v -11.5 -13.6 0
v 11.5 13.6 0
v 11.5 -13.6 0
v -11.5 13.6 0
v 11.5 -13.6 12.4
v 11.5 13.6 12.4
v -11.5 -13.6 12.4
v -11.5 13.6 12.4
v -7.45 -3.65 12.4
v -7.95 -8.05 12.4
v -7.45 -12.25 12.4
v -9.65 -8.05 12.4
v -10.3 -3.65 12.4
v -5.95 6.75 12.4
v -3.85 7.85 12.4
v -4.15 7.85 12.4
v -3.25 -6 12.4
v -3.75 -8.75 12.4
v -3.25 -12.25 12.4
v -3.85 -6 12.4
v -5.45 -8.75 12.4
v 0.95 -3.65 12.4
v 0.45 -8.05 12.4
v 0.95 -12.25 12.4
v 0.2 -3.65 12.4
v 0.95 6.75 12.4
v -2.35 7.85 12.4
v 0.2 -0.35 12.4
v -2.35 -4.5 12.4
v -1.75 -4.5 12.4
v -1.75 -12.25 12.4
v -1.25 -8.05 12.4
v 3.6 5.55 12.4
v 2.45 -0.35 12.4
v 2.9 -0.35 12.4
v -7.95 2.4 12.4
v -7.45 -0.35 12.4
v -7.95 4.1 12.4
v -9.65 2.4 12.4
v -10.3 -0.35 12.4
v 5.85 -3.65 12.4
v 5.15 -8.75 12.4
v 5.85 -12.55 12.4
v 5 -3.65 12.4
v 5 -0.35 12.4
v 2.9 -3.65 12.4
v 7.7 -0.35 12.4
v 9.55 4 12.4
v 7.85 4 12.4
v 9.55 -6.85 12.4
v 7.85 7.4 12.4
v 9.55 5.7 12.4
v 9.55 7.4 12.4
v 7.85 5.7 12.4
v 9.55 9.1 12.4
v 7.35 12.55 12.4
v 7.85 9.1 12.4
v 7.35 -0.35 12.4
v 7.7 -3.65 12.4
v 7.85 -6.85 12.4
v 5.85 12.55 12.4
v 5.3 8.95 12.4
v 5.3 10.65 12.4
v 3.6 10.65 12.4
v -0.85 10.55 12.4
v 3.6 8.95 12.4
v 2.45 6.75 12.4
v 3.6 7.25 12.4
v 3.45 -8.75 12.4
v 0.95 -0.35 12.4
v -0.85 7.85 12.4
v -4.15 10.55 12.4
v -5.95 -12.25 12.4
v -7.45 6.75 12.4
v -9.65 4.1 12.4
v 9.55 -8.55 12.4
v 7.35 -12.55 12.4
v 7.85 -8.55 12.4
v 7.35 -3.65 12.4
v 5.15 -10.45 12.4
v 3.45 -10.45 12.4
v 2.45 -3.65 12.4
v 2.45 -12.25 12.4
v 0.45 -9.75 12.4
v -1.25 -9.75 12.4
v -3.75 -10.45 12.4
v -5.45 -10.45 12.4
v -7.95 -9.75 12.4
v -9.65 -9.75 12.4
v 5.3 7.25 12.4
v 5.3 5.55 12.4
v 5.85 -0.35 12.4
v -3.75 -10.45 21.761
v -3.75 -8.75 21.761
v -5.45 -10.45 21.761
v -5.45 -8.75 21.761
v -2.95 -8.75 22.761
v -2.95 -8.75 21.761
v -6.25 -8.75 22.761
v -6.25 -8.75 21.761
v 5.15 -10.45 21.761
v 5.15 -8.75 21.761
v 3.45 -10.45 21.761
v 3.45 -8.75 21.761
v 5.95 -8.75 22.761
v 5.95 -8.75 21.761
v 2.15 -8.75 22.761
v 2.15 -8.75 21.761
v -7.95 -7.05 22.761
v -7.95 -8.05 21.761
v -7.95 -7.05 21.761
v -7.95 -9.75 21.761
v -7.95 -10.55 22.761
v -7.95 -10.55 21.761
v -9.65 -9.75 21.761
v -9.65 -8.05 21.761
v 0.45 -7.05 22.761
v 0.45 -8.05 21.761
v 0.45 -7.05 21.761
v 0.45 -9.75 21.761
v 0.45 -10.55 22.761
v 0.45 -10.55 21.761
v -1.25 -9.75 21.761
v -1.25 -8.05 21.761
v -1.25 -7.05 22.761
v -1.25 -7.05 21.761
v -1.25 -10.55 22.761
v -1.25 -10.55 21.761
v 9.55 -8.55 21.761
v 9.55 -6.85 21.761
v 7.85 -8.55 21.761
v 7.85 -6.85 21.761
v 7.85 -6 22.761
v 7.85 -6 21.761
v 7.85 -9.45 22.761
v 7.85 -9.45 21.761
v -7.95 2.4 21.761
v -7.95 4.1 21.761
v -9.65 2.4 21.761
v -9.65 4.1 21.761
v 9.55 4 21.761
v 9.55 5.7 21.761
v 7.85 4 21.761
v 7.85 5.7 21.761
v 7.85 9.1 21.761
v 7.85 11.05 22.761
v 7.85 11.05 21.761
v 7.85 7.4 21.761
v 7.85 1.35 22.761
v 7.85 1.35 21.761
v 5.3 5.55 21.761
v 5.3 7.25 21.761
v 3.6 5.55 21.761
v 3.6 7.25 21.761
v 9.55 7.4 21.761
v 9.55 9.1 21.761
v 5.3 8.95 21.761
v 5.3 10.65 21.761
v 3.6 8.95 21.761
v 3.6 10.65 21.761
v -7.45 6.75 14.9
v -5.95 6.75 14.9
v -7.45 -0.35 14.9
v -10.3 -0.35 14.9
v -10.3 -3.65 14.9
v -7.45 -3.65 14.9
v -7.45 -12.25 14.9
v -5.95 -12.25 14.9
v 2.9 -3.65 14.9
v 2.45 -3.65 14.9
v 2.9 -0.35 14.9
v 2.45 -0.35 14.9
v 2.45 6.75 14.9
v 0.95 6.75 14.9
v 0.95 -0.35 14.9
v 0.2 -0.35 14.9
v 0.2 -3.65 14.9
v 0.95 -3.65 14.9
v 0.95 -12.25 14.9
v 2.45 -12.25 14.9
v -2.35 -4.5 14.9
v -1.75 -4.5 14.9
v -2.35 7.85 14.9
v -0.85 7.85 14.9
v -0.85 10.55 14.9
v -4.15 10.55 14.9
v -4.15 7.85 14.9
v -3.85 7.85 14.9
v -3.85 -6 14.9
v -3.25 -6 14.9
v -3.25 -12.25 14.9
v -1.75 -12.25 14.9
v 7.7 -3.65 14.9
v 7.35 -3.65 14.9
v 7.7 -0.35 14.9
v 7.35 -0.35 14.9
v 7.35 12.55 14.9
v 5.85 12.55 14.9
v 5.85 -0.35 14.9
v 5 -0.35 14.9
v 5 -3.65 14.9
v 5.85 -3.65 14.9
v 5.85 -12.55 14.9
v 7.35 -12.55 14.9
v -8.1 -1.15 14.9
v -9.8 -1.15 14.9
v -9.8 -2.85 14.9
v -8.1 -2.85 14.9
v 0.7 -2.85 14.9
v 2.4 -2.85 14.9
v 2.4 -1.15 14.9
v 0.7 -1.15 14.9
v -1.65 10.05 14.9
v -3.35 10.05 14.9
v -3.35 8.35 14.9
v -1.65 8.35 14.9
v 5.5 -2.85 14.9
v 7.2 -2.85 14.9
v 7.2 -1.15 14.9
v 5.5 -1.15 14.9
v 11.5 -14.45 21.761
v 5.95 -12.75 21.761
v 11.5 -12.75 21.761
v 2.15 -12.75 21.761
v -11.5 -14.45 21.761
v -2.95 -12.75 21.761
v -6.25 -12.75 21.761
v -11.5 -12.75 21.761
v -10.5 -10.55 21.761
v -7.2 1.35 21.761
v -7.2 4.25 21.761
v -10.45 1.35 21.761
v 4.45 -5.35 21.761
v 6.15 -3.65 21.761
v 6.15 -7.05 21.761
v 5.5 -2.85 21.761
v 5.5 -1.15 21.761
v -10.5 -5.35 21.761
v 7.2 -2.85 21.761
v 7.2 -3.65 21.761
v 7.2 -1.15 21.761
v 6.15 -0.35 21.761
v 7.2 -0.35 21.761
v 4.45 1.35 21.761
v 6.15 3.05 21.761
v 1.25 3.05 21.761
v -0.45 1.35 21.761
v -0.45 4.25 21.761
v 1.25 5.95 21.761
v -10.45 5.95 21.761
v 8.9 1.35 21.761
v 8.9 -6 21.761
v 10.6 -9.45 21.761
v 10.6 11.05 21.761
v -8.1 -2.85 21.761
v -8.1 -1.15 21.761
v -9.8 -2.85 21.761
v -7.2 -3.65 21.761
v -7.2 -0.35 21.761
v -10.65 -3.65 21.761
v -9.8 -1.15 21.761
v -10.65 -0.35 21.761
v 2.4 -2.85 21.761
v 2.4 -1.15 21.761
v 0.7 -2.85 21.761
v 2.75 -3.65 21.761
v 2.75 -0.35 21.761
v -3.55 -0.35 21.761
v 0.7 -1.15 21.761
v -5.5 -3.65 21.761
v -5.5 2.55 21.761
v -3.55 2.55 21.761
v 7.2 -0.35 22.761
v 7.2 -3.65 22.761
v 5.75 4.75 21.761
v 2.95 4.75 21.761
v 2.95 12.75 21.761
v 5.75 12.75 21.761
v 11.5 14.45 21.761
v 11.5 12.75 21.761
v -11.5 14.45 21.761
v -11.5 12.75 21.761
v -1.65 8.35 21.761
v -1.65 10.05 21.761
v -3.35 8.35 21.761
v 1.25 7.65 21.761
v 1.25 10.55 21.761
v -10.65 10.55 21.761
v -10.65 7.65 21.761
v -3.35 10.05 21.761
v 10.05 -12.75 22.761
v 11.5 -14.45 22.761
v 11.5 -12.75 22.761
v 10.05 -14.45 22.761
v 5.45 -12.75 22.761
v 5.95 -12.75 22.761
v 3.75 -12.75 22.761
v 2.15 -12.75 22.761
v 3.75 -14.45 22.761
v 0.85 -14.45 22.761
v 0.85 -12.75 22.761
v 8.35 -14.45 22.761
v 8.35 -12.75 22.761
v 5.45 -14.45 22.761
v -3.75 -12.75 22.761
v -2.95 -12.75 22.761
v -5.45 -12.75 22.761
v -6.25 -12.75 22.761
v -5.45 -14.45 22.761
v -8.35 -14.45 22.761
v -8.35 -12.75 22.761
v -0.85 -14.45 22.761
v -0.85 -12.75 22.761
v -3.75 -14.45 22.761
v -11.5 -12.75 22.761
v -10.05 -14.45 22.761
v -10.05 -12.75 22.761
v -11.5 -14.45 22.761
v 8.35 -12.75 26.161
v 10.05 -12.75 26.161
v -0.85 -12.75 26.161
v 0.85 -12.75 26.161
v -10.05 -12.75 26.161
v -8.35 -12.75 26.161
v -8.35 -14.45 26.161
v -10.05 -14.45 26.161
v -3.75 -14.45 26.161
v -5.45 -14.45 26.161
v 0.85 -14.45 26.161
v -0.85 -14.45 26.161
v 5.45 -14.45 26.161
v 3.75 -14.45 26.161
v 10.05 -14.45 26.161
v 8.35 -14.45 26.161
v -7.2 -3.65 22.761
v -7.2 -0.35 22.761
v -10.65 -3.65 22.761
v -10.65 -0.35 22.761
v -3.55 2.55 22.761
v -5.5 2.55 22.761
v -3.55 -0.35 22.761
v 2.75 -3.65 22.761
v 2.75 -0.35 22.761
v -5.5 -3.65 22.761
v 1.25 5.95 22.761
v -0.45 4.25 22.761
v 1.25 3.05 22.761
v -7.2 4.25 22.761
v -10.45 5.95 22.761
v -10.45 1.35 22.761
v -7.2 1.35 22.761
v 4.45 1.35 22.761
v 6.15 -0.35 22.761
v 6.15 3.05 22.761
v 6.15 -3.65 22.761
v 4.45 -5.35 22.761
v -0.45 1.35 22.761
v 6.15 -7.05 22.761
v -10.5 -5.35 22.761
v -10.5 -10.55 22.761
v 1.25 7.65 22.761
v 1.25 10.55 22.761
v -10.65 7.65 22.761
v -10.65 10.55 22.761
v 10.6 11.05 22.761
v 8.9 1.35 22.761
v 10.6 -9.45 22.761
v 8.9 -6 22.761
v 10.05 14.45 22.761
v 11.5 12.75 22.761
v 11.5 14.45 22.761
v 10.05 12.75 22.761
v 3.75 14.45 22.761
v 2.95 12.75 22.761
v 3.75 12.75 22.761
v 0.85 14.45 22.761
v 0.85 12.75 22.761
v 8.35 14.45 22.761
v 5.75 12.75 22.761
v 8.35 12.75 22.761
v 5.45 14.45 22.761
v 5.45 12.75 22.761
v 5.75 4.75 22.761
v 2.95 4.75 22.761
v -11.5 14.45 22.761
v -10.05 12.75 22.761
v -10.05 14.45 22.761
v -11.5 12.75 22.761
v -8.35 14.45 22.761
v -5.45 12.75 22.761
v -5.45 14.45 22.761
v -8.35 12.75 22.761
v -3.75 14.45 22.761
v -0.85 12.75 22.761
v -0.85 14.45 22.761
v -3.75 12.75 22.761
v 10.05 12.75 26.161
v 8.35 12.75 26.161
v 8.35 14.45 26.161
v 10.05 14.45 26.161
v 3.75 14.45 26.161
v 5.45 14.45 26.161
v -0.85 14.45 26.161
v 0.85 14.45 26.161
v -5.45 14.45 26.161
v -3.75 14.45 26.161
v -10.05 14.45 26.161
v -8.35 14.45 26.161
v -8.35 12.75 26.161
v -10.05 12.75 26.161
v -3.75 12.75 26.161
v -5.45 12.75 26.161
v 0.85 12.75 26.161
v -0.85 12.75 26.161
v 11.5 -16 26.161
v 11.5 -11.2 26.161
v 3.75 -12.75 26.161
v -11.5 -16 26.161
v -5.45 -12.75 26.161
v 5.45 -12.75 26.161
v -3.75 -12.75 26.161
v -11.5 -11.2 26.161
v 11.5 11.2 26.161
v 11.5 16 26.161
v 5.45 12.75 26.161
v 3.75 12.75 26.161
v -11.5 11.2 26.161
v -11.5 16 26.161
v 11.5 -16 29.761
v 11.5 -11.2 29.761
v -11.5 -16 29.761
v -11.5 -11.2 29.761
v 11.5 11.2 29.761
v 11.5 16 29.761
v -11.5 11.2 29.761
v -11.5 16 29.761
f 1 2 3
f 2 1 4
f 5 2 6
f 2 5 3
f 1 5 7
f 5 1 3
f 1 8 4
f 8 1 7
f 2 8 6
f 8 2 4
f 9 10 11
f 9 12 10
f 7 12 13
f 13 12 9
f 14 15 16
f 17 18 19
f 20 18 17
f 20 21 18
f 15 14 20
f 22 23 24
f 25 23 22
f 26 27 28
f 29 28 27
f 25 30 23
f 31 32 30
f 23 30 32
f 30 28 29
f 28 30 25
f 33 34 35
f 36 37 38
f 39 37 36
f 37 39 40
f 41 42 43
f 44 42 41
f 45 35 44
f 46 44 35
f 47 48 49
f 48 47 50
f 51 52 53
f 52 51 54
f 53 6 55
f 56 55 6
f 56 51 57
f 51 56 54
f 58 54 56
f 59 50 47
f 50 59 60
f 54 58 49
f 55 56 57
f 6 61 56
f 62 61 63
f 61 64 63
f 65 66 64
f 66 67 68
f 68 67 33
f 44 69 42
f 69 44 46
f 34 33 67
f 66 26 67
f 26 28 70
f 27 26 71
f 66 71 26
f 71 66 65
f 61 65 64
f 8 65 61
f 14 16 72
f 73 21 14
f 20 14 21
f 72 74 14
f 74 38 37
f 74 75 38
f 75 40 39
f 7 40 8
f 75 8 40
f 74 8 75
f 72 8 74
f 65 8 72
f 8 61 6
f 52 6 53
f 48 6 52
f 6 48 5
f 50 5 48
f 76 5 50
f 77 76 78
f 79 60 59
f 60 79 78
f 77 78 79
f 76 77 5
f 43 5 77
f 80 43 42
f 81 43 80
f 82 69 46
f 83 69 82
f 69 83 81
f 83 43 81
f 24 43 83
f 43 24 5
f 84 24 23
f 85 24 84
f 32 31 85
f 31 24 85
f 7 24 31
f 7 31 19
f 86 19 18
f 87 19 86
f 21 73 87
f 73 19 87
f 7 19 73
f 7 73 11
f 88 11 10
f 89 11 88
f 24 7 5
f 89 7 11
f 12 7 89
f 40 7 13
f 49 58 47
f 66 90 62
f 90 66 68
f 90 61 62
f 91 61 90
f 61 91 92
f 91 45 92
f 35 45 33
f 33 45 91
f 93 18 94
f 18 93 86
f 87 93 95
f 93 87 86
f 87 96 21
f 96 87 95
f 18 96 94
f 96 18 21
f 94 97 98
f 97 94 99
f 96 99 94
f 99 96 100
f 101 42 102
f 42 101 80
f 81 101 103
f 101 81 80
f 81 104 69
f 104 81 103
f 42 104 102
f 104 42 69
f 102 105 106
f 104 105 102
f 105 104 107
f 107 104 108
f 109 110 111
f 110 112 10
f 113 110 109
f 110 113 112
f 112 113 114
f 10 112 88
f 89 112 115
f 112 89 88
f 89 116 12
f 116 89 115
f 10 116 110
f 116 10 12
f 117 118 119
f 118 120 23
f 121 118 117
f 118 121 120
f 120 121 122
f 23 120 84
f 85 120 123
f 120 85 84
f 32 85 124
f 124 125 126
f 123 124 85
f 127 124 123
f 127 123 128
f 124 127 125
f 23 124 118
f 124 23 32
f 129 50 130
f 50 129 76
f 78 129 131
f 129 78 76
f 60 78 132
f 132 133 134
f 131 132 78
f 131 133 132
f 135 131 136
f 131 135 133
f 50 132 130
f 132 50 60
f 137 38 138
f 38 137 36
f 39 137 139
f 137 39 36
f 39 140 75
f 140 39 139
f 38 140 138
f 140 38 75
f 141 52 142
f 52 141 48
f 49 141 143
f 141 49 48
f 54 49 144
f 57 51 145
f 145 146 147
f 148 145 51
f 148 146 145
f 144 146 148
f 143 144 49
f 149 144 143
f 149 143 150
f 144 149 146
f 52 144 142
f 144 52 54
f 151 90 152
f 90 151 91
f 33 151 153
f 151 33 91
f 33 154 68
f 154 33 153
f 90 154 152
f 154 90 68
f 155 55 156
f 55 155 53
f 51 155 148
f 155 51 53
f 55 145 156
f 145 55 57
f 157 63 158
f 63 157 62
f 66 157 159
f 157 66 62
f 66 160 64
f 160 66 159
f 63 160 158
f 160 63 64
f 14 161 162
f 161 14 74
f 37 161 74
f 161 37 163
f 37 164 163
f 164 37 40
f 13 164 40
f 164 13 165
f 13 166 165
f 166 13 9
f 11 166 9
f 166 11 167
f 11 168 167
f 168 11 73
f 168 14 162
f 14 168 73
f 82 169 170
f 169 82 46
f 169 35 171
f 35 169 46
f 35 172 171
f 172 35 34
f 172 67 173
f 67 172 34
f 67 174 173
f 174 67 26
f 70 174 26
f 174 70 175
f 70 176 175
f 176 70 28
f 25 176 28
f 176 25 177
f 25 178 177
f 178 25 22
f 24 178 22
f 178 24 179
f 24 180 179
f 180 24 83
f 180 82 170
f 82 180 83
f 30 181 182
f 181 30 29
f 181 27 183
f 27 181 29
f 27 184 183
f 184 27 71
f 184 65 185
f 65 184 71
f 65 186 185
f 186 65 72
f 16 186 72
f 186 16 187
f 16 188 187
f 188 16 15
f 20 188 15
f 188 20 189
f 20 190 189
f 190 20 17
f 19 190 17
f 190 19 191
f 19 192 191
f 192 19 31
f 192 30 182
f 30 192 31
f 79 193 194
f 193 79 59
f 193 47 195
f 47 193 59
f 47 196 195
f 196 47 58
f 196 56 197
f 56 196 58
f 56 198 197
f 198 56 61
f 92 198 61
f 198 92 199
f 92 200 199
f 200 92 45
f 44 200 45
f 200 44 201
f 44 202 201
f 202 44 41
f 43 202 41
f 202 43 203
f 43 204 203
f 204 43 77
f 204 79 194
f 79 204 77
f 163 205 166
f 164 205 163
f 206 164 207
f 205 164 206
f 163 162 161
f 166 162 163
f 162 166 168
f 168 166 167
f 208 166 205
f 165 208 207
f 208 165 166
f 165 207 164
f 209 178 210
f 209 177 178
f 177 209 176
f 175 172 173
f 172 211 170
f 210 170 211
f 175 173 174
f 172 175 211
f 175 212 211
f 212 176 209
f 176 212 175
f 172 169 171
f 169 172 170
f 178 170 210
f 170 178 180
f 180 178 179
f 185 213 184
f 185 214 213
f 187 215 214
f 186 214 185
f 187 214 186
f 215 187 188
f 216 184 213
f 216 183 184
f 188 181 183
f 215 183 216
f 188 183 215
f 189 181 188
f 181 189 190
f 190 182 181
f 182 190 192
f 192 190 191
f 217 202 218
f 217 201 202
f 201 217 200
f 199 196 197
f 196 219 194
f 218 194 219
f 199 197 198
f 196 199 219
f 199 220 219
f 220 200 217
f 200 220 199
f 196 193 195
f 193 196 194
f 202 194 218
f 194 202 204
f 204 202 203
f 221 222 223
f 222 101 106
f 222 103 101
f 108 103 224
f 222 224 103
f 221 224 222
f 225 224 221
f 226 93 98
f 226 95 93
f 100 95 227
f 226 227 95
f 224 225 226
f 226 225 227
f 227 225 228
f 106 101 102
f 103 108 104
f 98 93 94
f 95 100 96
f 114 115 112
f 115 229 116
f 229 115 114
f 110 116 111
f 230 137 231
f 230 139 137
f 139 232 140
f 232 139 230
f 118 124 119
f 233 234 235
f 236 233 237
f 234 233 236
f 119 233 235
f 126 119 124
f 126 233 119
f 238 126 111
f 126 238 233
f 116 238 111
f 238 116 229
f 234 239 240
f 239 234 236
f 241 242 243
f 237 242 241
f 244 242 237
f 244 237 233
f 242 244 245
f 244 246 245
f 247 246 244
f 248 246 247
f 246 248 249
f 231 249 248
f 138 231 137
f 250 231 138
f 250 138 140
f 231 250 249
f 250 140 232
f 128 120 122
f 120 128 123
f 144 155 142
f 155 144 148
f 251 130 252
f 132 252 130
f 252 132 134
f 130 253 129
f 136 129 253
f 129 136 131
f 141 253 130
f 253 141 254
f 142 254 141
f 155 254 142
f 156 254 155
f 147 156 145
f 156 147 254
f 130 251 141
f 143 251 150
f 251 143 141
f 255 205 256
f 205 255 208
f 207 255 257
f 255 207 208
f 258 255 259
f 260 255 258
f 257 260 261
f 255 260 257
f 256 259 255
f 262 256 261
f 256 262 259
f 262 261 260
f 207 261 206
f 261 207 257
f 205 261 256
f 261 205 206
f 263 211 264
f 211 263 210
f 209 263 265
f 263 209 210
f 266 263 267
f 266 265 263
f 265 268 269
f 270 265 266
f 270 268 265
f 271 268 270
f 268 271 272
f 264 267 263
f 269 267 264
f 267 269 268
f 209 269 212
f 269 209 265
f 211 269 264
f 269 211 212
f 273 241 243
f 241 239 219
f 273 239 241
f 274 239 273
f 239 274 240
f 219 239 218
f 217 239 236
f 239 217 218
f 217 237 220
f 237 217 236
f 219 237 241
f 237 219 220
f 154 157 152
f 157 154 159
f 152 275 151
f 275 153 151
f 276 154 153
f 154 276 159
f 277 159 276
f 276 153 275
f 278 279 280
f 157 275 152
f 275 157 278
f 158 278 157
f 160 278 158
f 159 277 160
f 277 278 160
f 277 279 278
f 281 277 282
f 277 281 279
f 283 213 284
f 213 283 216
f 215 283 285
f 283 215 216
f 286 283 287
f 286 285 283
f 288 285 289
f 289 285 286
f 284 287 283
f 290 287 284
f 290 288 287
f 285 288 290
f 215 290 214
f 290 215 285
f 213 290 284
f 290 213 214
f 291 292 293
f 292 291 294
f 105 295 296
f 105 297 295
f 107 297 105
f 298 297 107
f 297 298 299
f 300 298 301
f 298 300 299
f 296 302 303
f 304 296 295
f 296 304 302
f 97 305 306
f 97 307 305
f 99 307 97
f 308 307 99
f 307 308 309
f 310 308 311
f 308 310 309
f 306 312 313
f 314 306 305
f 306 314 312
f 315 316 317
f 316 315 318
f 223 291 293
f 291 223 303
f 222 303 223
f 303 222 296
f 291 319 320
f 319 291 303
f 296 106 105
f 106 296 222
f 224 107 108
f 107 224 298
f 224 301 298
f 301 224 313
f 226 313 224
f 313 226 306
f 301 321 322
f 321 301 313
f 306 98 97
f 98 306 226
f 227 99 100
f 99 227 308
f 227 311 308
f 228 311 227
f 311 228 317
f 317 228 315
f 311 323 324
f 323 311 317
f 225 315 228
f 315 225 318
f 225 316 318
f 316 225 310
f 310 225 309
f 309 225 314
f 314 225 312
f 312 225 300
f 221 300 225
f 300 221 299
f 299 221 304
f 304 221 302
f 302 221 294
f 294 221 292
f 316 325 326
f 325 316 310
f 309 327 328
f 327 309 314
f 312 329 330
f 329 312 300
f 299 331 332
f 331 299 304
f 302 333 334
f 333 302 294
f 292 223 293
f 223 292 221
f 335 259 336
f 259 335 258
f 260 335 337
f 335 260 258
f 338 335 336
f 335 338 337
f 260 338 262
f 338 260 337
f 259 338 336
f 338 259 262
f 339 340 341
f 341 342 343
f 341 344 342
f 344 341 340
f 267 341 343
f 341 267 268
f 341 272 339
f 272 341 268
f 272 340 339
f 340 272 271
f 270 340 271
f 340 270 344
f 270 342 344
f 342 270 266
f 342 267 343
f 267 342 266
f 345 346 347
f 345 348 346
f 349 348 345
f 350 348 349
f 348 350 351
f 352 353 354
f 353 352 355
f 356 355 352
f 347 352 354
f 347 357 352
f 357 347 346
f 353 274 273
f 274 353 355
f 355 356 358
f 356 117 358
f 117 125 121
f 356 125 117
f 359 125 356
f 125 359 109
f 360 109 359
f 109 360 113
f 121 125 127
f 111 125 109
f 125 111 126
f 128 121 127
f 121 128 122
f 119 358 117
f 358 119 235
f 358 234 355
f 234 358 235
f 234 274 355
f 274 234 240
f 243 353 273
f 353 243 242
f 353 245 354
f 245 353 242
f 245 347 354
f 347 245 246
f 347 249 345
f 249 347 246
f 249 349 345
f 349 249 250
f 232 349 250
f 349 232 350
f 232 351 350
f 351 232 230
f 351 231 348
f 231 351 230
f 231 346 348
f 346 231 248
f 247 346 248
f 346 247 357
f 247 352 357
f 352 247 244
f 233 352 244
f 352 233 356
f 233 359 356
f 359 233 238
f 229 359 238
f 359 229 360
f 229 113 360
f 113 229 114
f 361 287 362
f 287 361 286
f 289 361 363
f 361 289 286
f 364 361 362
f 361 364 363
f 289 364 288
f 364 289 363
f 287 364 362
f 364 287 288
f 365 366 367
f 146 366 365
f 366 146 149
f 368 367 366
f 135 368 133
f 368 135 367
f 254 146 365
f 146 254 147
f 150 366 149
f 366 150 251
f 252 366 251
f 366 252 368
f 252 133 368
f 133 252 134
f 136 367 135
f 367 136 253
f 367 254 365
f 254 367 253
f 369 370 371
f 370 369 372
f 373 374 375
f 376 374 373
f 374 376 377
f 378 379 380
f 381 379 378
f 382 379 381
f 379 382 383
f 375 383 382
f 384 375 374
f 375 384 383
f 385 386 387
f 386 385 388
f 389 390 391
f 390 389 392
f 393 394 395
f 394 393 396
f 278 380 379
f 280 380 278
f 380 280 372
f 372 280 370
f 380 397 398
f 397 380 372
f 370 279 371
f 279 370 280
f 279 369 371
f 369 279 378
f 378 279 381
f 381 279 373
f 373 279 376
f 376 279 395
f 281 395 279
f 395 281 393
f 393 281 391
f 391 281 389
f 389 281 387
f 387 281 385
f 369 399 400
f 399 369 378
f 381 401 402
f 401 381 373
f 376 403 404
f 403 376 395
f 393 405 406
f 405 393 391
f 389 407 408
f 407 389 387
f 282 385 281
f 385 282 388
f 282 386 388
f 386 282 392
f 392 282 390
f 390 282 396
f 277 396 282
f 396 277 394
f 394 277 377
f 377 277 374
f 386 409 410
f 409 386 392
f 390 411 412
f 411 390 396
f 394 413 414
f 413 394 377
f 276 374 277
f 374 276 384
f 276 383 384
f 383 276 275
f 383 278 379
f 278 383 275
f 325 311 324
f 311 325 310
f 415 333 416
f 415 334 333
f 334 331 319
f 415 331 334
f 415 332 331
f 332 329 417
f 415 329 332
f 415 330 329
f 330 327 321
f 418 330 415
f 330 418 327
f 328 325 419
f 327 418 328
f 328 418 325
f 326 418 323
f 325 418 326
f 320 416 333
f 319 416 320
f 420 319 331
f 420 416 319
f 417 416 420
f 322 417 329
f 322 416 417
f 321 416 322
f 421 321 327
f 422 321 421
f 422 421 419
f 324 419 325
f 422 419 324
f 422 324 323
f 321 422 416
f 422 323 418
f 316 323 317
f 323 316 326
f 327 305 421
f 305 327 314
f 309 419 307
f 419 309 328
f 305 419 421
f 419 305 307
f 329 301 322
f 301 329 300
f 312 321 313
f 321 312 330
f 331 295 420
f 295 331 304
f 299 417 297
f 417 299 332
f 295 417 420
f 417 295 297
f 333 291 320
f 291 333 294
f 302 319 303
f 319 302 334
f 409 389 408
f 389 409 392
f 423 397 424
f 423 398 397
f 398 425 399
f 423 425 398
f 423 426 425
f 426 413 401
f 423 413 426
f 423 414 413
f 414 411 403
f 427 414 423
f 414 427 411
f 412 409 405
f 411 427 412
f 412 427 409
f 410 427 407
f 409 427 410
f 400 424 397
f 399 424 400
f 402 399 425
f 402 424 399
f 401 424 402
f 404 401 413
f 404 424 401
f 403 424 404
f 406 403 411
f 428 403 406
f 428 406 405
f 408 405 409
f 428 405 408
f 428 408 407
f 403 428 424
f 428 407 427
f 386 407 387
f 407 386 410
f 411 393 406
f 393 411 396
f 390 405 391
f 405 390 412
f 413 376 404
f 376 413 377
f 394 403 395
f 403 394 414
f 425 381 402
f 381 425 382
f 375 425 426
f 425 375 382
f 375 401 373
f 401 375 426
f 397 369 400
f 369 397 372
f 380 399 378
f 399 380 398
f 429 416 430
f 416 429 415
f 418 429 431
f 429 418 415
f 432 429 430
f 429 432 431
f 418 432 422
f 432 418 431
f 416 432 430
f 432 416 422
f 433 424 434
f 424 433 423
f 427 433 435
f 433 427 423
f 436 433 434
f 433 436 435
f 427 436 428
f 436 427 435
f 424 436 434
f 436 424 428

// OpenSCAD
// Generated by SolidPython 0.4.2 on 2020-09-29 23:22:12
//!OpenSCAD

scale(v = 0.0100000000) {
	translate(v = [-1150, -1360, 0]) {
		union() {
			color(c = [0.4000000000, 0.4000000000, 0.4000000000]) {
				translate(v = [0, 0, 0]) {
					linear_extrude(height = 1000.0000000000) {
						polygon(paths = [[0, 1, 2, 3]], points = [[0, 0], [0, 2720], [2300, 2720], [2300, 0]]);
					}
				}
			}
			color(c = [0.2000000000, 0.6000000000, 0.2000000000]) {
				translate(v = [0, 0, 1000.0000000000]) {
					linear_extrude(height = 120.0000000000) {
						polygon(paths = [[0, 1, 2, 3]], points = [[0, 1305], [0, 2720], [2300, 2720], [2300, 1305]]);
					}
				}
			}
			color(c = [0.4000000000, 0.4000000000, 0.4000000000]) {
				translate(v = [0, 0, 1000.0000000000]) {
					linear_extrude(height = 120.0000000000) {
						polygon(paths = [[0, 1, 2, 3]], points = [[0, 0], [0, 1305], [2300, 1305], [2300, 0]]);
					}
				}
			}
			color(c = [0.9000000000, 0.6000000000, 0.6000000000]) {
				translate(v = [0, 0, 1120.0000000000]) {
					linear_extrude(height = 120.0000000000) {
						polygon(paths = [[0, 1, 2, 3]], points = [[145, 1485], [145, 1905], [405, 1905], [405, 1485]]);
					}
				}
			}
			color(c = [0.9000000000, 0.6000000000, 0.6000000000]) {
				translate(v = [0, 0, 1120.0000000000]) {
					linear_extrude(height = 120.0000000000) {
						polygon(paths = [[0, 1, 2, 3]], points = [[555, 1485], [555, 1905], [765, 1905], [765, 1485]]);
					}
				}
			}
			color(c = [0.9000000000, 0.6000000000, 0.6000000000]) {
				translate(v = [0, 0, 1120.0000000000]) {
					linear_extrude(height = 120.0000000000) {
						polygon(paths = [[0, 1, 2, 3]], points = [[915, 1485], [915, 1905], [1245, 1905], [1245, 1485]]);
					}
				}
			}
			color(c = [0.9000000000, 0.6000000000, 0.6000000000]) {
				translate(v = [0, 0, 1120.0000000000]) {
					linear_extrude(height = 120.0000000000) {
						polygon(paths = [[0, 1, 2, 3, 4, 5]], points = [[1395, 1485], [1395, 1905], [1470, 1905], [1470, 2485], [1735, 2485], [1735, 1485]]);
					}
				}
			}
			color(c = [0.9000000000, 0.6000000000, 0.6000000000]) {
				translate(v = [0, 0, 1120.0000000000]) {
					linear_extrude(height = 120.0000000000) {
						polygon(paths = [[0, 1, 2, 3]], points = [[1885, 1485], [1885, 2485], [2165, 2485], [2165, 1485]]);
					}
				}
			}
			color(c = [0.9000000000, 0.6000000000, 0.9000000000]) {
				translate(v = [0, 0, 1120.0000000000]) {
					linear_extrude(height = 120.0000000000) {
						polygon(paths = [[0, 1, 2, 3]], points = [[145, 265], [145, 685], [405, 685], [405, 265]]);
					}
				}
			}
			color(c = [0.9000000000, 0.6000000000, 0.9000000000]) {
				translate(v = [0, 0, 1120.0000000000]) {
					linear_extrude(height = 120.0000000000) {
						polygon(paths = [[0, 1, 2, 3]], points = [[555, 265], [555, 685], [825, 685], [825, 265]]);
					}
				}
			}
			color(c = [0.9000000000, 0.6000000000, 0.9000000000]) {
				translate(v = [0, 0, 1120.0000000000]) {
					linear_extrude(height = 120.0000000000) {
						polygon(paths = [[0, 1, 2, 3]], points = [[975, 265], [975, 685], [1245, 685], [1245, 265]]);
					}
				}
			}
			color(c = [0.9000000000, 0.6000000000, 0.9000000000]) {
				translate(v = [0, 0, 1120.0000000000]) {
					linear_extrude(height = 120.0000000000) {
						polygon(paths = [[0, 1, 2, 3, 4, 5, 6, 7]], points = [[1470, 235], [1470, 265], [1395, 265], [1395, 685], [1470, 685], [1470, 885], [1735, 885], [1735, 235]]);
					}
				}
			}
			color(c = [0.9000000000, 0.6000000000, 0.9000000000]) {
				translate(v = [0, 0, 1120.0000000000]) {
					linear_extrude(height = 120.0000000000) {
						polygon(paths = [[0, 1, 2, 3]], points = [[1885, 235], [1885, 885], [2165, 885], [2165, 235]]);
					}
				}
			}
			color(c = [0.2000000000, 0.6000000000, 0.2000000000]) {
				translate(v = [0, 0, 1120.0000000000]) {
					linear_extrude(height = 120.0000000000) {
						difference() {
							polygon(paths = [[0, 1, 2, 3]], points = [[0, 1305], [0, 2720], [2300, 2720], [2300, 1305]]);
							polygon(paths = [[0, 1, 2, 3]], points = [[145, 1485], [405, 1485], [405, 1905], [145, 1905]]);
							polygon(paths = [[0, 1, 2, 3]], points = [[555, 1485], [765, 1485], [765, 1905], [555, 1905]]);
							polygon(paths = [[0, 1, 2, 3]], points = [[915, 1485], [1245, 1485], [1245, 1905], [915, 1905]]);
							polygon(paths = [[0, 1, 2, 3]], points = [[1885, 1485], [2165, 1485], [2165, 2485], [1885, 2485]]);
							polygon(paths = [[0, 1, 2, 3, 4, 5]], points = [[1395, 1485], [1735, 1485], [1735, 2485], [1470, 2485], [1470, 1905], [1395, 1905]]);
						}
					}
				}
			}
			color(c = [0.4000000000, 0.4000000000, 0.4000000000]) {
				translate(v = [0, 0, 1120.0000000000]) {
					linear_extrude(height = 120.0000000000) {
						difference() {
							polygon(paths = [[0, 1, 2, 3]], points = [[0, 0], [0, 1305], [2300, 1305], [2300, 0]]);
							polygon(paths = [[0, 1, 2, 3]], points = [[1885, 235], [2165, 235], [2165, 885], [1885, 885]]);
							polygon(paths = [[0, 1, 2, 3]], points = [[145, 265], [405, 265], [405, 685], [145, 685]]);
							polygon(paths = [[0, 1, 2, 3]], points = [[555, 265], [825, 265], [825, 685], [555, 685]]);
							polygon(paths = [[0, 1, 2, 3]], points = [[975, 265], [1245, 265], [1245, 685], [975, 685]]);
							polygon(paths = [[0, 1, 2, 3, 4, 5, 6, 7]], points = [[1470, 235], [1735, 235], [1735, 885], [1470, 885], [1470, 685], [1395, 685], [1395, 265], [1470, 265]]);
						}
					}
				}
			}
			color(c = [0.1000000000, 0.1000000000, 0.1000000000]) {
				translate(v = [0, 0, 1240.0000000000]) {
					linear_extrude(height = 70.0000000000) {
						polygon(paths = [[0, 1, 2, 3]], points = [[605, 315], [605, 485], [775, 485], [775, 315]]);
					}
				}
			}
			color(c = [0.1000000000, 0.1000000000, 0.1000000000]) {
				translate(v = [0, 0, 1240.0000000000]) {
					linear_extrude(height = 70.0000000000) {
						polygon(paths = [[0, 1, 2, 3]], points = [[1495, 315], [1495, 485], [1665, 485], [1665, 315]]);
					}
				}
			}
			color(c = [0.1000000000, 0.1000000000, 0.1000000000]) {
				translate(v = [0, 0, 1240.0000000000]) {
					linear_extrude(height = 70.0000000000) {
						polygon(paths = [[0, 1, 2, 3]], points = [[185, 385], [185, 555], [355, 555], [355, 385]]);
					}
				}
			}
			color(c = [0.1000000000, 0.1000000000, 0.1000000000]) {
				translate(v = [0, 0, 1240.0000000000]) {
					linear_extrude(height = 70.0000000000) {
						polygon(paths = [[0, 1, 2, 3]], points = [[1025, 385], [1025, 555], [1195, 555], [1195, 385]]);
					}
				}
			}
			color(c = [0.1000000000, 0.1000000000, 0.1000000000]) {
				translate(v = [0, 0, 1240.0000000000]) {
					linear_extrude(height = 70.0000000000) {
						polygon(paths = [[0, 1, 2, 3]], points = [[1935, 505], [1935, 675], [2105, 675], [2105, 505]]);
					}
				}
			}
			color(c = [0.1000000000, 0.1000000000, 0.1000000000]) {
				translate(v = [0, 0, 1240.0000000000]) {
					linear_extrude(height = 70.0000000000) {
						polygon(paths = [[0, 1, 2, 3]], points = [[185, 1600], [185, 1770], [355, 1770], [355, 1600]]);
					}
				}
			}
			color(c = [0.1000000000, 0.1000000000, 0.1000000000]) {
				translate(v = [0, 0, 1240.0000000000]) {
					linear_extrude(height = 70.0000000000) {
						polygon(paths = [[0, 1, 2, 3]], points = [[1935, 1760], [1935, 1930], [2105, 1930], [2105, 1760]]);
					}
				}
			}
			color(c = [0.1000000000, 0.1000000000, 0.1000000000]) {
				translate(v = [0, 0, 1240.0000000000]) {
					linear_extrude(height = 70.0000000000) {
						polygon(paths = [[0, 1, 2, 3]], points = [[1510, 1915], [1510, 2085], [1680, 2085], [1680, 1915]]);
					}
				}
			}
			color(c = [0.1000000000, 0.1000000000, 0.1000000000]) {
				translate(v = [0, 0, 1240.0000000000]) {
					linear_extrude(height = 70.0000000000) {
						polygon(paths = [[0, 1, 2, 3]], points = [[1935, 2100], [1935, 2270], [2105, 2270], [2105, 2100]]);
					}
				}
			}
			color(c = [0.1000000000, 0.1000000000, 0.1000000000]) {
				translate(v = [0, 0, 1240.0000000000]) {
					linear_extrude(height = 70.0000000000) {
						polygon(paths = [[0, 1, 2, 3]], points = [[1510, 2255], [1510, 2425], [1680, 2425], [1680, 2255]]);
					}
				}
			}
			color(c = [1.0000000000, 1.0000000000, 1.0000000000]) {
				translate(v = [0, 0, 1240.0000000000]) {
					linear_extrude(height = 70.0000000000) {
						polygon(paths = [[0, 1, 2, 3, 4, 5, 6, 7]], points = [[405, 135], [405, 995], [120, 995], [120, 1325], [405, 1325], [405, 2035], [555, 2035], [555, 135]]);
					}
				}
			}
			color(c = [1.0000000000, 1.0000000000, 1.0000000000]) {
				translate(v = [0, 0, 1240.0000000000]) {
					linear_extrude(height = 70.0000000000) {
						polygon(paths = [[0, 1, 2, 3, 4, 5, 6, 7, 8, 9, 10, 11]], points = [[1245, 135], [1245, 995], [1170, 995], [1170, 1325], [1245, 1325], [1245, 2035], [1395, 2035], [1395, 1325], [1440, 1325], [1440, 995], [1395, 995], [1395, 135]]);
					}
				}
			}
			color(c = [1.0000000000, 1.0000000000, 1.0000000000]) {
				translate(v = [0, 0, 1240.0000000000]) {
					linear_extrude(height = 70.0000000000) {
						polygon(paths = [[0, 1, 2, 3, 4, 5, 6, 7, 8, 9, 10, 11]], points = [[825, 135], [825, 760], [765, 760], [765, 2145], [735, 2145], [735, 2415], [1065, 2415], [1065, 2145], [915, 2145], [915, 910], [975, 910], [975, 135]]);
					}
				}
			}
			color(c = [1.0000000000, 1.0000000000, 1.0000000000]) {
				translate(v = [0, 0, 1240.0000000000]) {
					linear_extrude(height = 70.0000000000) {
						polygon(paths = [[0, 1, 2, 3, 4, 5, 6, 7, 8, 9, 10, 11]], points = [[1735, 105], [1735, 995], [1650, 995], [1650, 1325], [1735, 1325], [1735, 2615], [1885, 2615], [1885, 1325], [1920, 1325], [1920, 995], [1885, 995], [1885, 105]]);
					}
				}
			}
			color(c = [0.1000000000, 0.1000000000, 0.1000000000]) {
				translate(v = [0, 0, 1310.0000000000]) {
					linear_extrude(height = 180.0000000000) {
						polygon(paths = [[0, 1, 2, 3]], points = [[605, 315], [605, 485], [775, 485], [775, 315]]);
					}
				}
			}
			color(c = [0.1000000000, 0.1000000000, 0.1000000000]) {
				translate(v = [0, 0, 1310.0000000000]) {
					linear_extrude(height = 180.0000000000) {
						polygon(paths = [[0, 1, 2, 3]], points = [[1495, 315], [1495, 485], [1665, 485], [1665, 315]]);
					}
				}
			}
			color(c = [0.1000000000, 0.1000000000, 0.1000000000]) {
				translate(v = [0, 0, 1310.0000000000]) {
					linear_extrude(height = 180.0000000000) {
						polygon(paths = [[0, 1, 2, 3]], points = [[185, 385], [185, 555], [355, 555], [355, 385]]);
					}
				}
			}
			color(c = [0.1000000000, 0.1000000000, 0.1000000000]) {
				translate(v = [0, 0, 1310.0000000000]) {
					linear_extrude(height = 180.0000000000) {
						polygon(paths = [[0, 1, 2, 3]], points = [[1025, 385], [1025, 555], [1195, 555], [1195, 385]]);
					}
				}
			}
			color(c = [0.1000000000, 0.1000000000, 0.1000000000]) {
				translate(v = [0, 0, 1310.0000000000]) {
					linear_extrude(height = 180.0000000000) {
						polygon(paths = [[0, 1, 2, 3]], points = [[1935, 505], [1935, 675], [2105, 675], [2105, 505]]);
					}
				}
			}
			color(c = [0.1000000000, 0.1000000000, 0.1000000000]) {
				translate(v = [0, 0, 1310.0000000000]) {
					linear_extrude(height = 180.0000000000) {
						polygon(paths = [[0, 1, 2, 3]], points = [[185, 1600], [185, 1770], [355, 1770], [355, 1600]]);
					}
				}
			}
			color(c = [0.1000000000, 0.1000000000, 0.1000000000]) {
				translate(v = [0, 0, 1310.0000000000]) {
					linear_extrude(height = 180.0000000000) {
						polygon(paths = [[0, 1, 2, 3]], points = [[1935, 1760], [1935, 1930], [2105, 1930], [2105, 1760]]);
					}
				}
			}
			color(c = [0.1000000000, 0.1000000000, 0.1000000000]) {
				translate(v = [0, 0, 1310.0000000000]) {
					linear_extrude(height = 180.0000000000) {
						polygon(paths = [[0, 1, 2, 3]], points = [[1510, 1915], [1510, 2085], [1680, 2085], [1680, 1915]]);
					}
				}
			}
			color(c = [0.1000000000, 0.1000000000, 0.1000000000]) {
				translate(v = [0, 0, 1310.0000000000]) {
					linear_extrude(height = 180.0000000000) {
						polygon(paths = [[0, 1, 2, 3]], points = [[1935, 2100], [1935, 2270], [2105, 2270], [2105, 2100]]);
					}
				}
			}
			color(c = [0.1000000000, 0.1000000000, 0.1000000000]) {
				translate(v = [0, 0, 1310.0000000000]) {
					linear_extrude(height = 180.0000000000) {
						polygon(paths = [[0, 1, 2, 3]], points = [[1510, 2255], [1510, 2425], [1680, 2425], [1680, 2255]]);
					}
				}
			}
			color(c = [0.7000000000, 0, 0]) {
				translate(v = [0, 0, 1310.0000000000]) {
					linear_extrude(height = 180.0000000000) {
						polygon(paths = [[0, 1, 2, 3, 4, 5, 6, 7]], points = [[405, 135], [405, 995], [120, 995], [120, 1325], [405, 1325], [405, 2035], [555, 2035], [555, 135]]);
					}
				}
			}
			color(c = [0.7000000000, 0, 0]) {
				translate(v = [0, 0, 1310.0000000000]) {
					linear_extrude(height = 180.0000000000) {
						polygon(paths = [[0, 1, 2, 3, 4, 5, 6, 7, 8, 9, 10, 11]], points = [[1245, 135], [1245, 995], [1170, 995], [1170, 1325], [1245, 1325], [1245, 2035], [1395, 2035], [1395, 1325], [1440, 1325], [1440, 995], [1395, 995], [1395, 135]]);
					}
				}
			}
			color(c = [0.7000000000, 0, 0]) {
				translate(v = [0, 0, 1310.0000000000]) {
					linear_extrude(height = 180.0000000000) {
						polygon(paths = [[0, 1, 2, 3, 4, 5, 6, 7, 8, 9, 10, 11]], points = [[825, 135], [825, 760], [765, 760], [765, 2145], [735, 2145], [735, 2415], [1065, 2415], [1065, 2145], [915, 2145], [915, 910], [975, 910], [975, 135]]);
					}
				}
			}
			color(c = [0.7000000000, 0, 0]) {
				translate(v = [0, 0, 1310.0000000000]) {
					linear_extrude(height = 180.0000000000) {
						polygon(paths = [[0, 1, 2, 3, 4, 5, 6, 7, 8, 9, 10, 11]], points = [[1735, 105], [1735, 995], [1650, 995], [1650, 1325], [1735, 1325], [1735, 2615], [1885, 2615], [1885, 1325], [1920, 1325], [1920, 995], [1885, 995], [1885, 105]]);
					}
				}
			}
			color(c = [0.1000000000, 0.1000000000, 0.1000000000]) {
				translate(v = [0, 0, 1490.0000000000]) {
					linear_extrude(height = 686.1000000000) {
						polygon(paths = [[0, 1, 2, 3]], points = [[605, 315], [605, 485], [775, 485], [775, 315]]);
					}
				}
			}
			color(c = [0.1000000000, 0.1000000000, 0.1000000000]) {
				translate(v = [0, 0, 1490.0000000000]) {
					linear_extrude(height = 686.1000000000) {
						polygon(paths = [[0, 1, 2, 3]], points = [[1495, 315], [1495, 485], [1665, 485], [1665, 315]]);
					}
				}
			}
			color(c = [0.1000000000, 0.1000000000, 0.1000000000]) {
				translate(v = [0, 0, 1490.0000000000]) {
					linear_extrude(height = 686.1000000000) {
						polygon(paths = [[0, 1, 2, 3]], points = [[185, 385], [185, 555], [355, 555], [355, 385]]);
					}
				}
			}
			color(c = [0.1000000000, 0.1000000000, 0.1000000000]) {
				translate(v = [0, 0, 1490.0000000000]) {
					linear_extrude(height = 686.1000000000) {
						polygon(paths = [[0, 1, 2, 3]], points = [[1025, 385], [1025, 555], [1195, 555], [1195, 385]]);
					}
				}
			}
			color(c = [0.1000000000, 0.1000000000, 0.1000000000]) {
				translate(v = [0, 0, 1490.0000000000]) {
					linear_extrude(height = 686.1000000000) {
						polygon(paths = [[0, 1, 2, 3]], points = [[1935, 505], [1935, 675], [2105, 675], [2105, 505]]);
					}
				}
			}
			color(c = [0.1000000000, 0.1000000000, 0.1000000000]) {
				translate(v = [0, 0, 1490.0000000000]) {
					linear_extrude(height = 686.1000000000) {
						polygon(paths = [[0, 1, 2, 3]], points = [[170, 1075], [170, 1245], [340, 1245], [340, 1075]]);
					}
				}
			}
			color(c = [0.1000000000, 0.1000000000, 0.1000000000]) {
				translate(v = [0, 0, 1490.0000000000]) {
					linear_extrude(height = 686.1000000000) {
						polygon(paths = [[0, 1, 2, 3]], points = [[1220, 1075], [1220, 1245], [1390, 1245], [1390, 1075]]);
					}
				}
			}
			color(c = [0.1000000000, 0.1000000000, 0.1000000000]) {
				translate(v = [0, 0, 1490.0000000000]) {
					linear_extrude(height = 686.1000000000) {
						polygon(paths = [[0, 1, 2, 3]], points = [[1700, 1075], [1700, 1245], [1870, 1245], [1870, 1075]]);
					}
				}
			}
			color(c = [0.1000000000, 0.1000000000, 0.1000000000]) {
				translate(v = [0, 0, 1490.0000000000]) {
					linear_extrude(height = 686.1000000000) {
						polygon(paths = [[0, 1, 2, 3]], points = [[185, 1600], [185, 1770], [355, 1770], [355, 1600]]);
					}
				}
			}
			color(c = [0.1000000000, 0.1000000000, 0.1000000000]) {
				translate(v = [0, 0, 1490.0000000000]) {
					linear_extrude(height = 686.1000000000) {
						polygon(paths = [[0, 1, 2, 3]], points = [[1935, 1760], [1935, 1930], [2105, 1930], [2105, 1760]]);
					}
				}
			}
			color(c = [0.1000000000, 0.1000000000, 0.1000000000]) {
				translate(v = [0, 0, 1490.0000000000]) {
					linear_extrude(height = 686.1000000000) {
						polygon(paths = [[0, 1, 2, 3]], points = [[1510, 1915], [1510, 2085], [1680, 2085], [1680, 1915]]);
					}
				}
			}
			color(c = [0.1000000000, 0.1000000000, 0.1000000000]) {
				translate(v = [0, 0, 1490.0000000000]) {
					linear_extrude(height = 686.1000000000) {
						polygon(paths = [[0, 1, 2, 3]], points = [[1935, 2100], [1935, 2270], [2105, 2270], [2105, 2100]]);
					}
				}
			}
			color(c = [0.1000000000, 0.1000000000, 0.1000000000]) {
				translate(v = [0, 0, 1490.0000000000]) {
					linear_extrude(height = 686.1000000000) {
						polygon(paths = [[0, 1, 2, 3]], points = [[815, 2195], [815, 2365], [985, 2365], [985, 2195]]);
					}
				}
			}
			color(c = [0.1000000000, 0.1000000000, 0.1000000000]) {
				translate(v = [0, 0, 1490.0000000000]) {
					linear_extrude(height = 686.1000000000) {
						polygon(paths = [[0, 1, 2, 3]], points = [[1510, 2255], [1510, 2425], [1680, 2425], [1680, 2255]]);
					}
				}
			}
			color(c = [0.9000000000, 0.6000000000, 0.6000000000]) {
				translate(v = [0, 0, 2176.1000000000]) {
					linear_extrude(height = 100.0000000000) {
						polygon(paths = [[0, 1, 2, 3, 4, 5, 6, 7, 8, 9, 10, 11]], points = [[0, -85], [0, 85], [525, 85], [525, 485], [855, 485], [855, 85], [1365, 85], [1365, 485], [1745, 485], [1745, 85], [2300, 85], [2300, -85]]);
					}
				}
			}
			color(c = [0.9000000000, 0.6000000000, 0.6000000000]) {
				translate(v = [0, 0, 2176.1000000000]) {
					linear_extrude(height = 100.0000000000) {
						polygon(paths = [[0, 1, 2, 3]], points = [[85, 995], [85, 1325], [430, 1325], [430, 995]]);
					}
				}
			}
			color(c = [0.9000000000, 0.6000000000, 0.6000000000]) {
				translate(v = [0, 0, 2176.1000000000]) {
					linear_extrude(height = 100.0000000000) {
						polygon(paths = [[0, 1, 2, 3, 4, 5]], points = [[600, 995], [600, 1615], [795, 1615], [795, 1325], [1425, 1325], [1425, 995]]);
					}
				}
			}
			color(c = [0.9000000000, 0.6000000000, 0.6000000000]) {
				translate(v = [0, 0, 2176.1000000000]) {
					linear_extrude(height = 100.0000000000) {
						polygon(paths = [[0, 1, 2, 3, 4, 5, 6, 7, 8, 9, 10, 11, 12, 13, 14, 15, 16, 17, 18, 19, 20, 21, 22, 23]], points = [[100, 305], [100, 825], [1595, 825], [1595, 1495], [1105, 1495], [1105, 1785], [430, 1785], [430, 1495], [105, 1495], [105, 1955], [1275, 1955], [1275, 1665], [1765, 1665], [1765, 1325], [1870, 1325], [1870, 995], [1765, 995], [1765, 655], [1195, 655], [1195, 305], [1025, 305], [1025, 655], [355, 655], [355, 305]]);
					}
				}
			}
			color(c = [0.9000000000, 0.6000000000, 0.6000000000]) {
				translate(v = [0, 0, 2176.1000000000]) {
					linear_extrude(height = 100.0000000000) {
						polygon(paths = [[0, 1, 2, 3]], points = [[85, 2125], [85, 2415], [1275, 2415], [1275, 2125]]);
					}
				}
			}
			color(c = [0.9000000000, 0.6000000000, 0.6000000000]) {
				translate(v = [0, 0, 2176.1000000000]) {
					linear_extrude(height = 100.0000000000) {
						polygon(paths = [[0, 1, 2, 3, 4, 5, 6, 7]], points = [[1935, 415], [1935, 760], [2040, 760], [2040, 1495], [1935, 1495], [1935, 2465], [2210, 2465], [2210, 415]]);
					}
				}
			}
			color(c = [0.9000000000, 0.6000000000, 0.6000000000]) {
				translate(v = [0, 0, 2176.1000000000]) {
					linear_extrude(height = 100.0000000000) {
						polygon(paths = [[0, 1, 2, 3, 4, 5, 6, 7]], points = [[1445, 1835], [1445, 2635], [0, 2635], [0, 2805], [2300, 2805], [2300, 2635], [1725, 2635], [1725, 1835]]);
					}
				}
			}
			color(c = [0.5000000000, 0.5000000000, 0.5000000000]) {
				translate(v = [0, 0, 2276.1000000000]) {
					linear_extrude(height = 340.0000000000) {
						polygon(paths = [[0, 1, 2, 3]], points = [[145, -85], [145, 85], [315, 85], [315, -85]]);
					}
				}
			}
			color(c = [0.5000000000, 0.5000000000, 0.5000000000]) {
				translate(v = [0, 0, 2276.1000000000]) {
					linear_extrude(height = 340.0000000000) {
						polygon(paths = [[0, 1, 2, 3]], points = [[605, -85], [605, 85], [775, 85], [775, -85]]);
					}
				}
			}
			color(c = [0.5000000000, 0.5000000000, 0.5000000000]) {
				translate(v = [0, 0, 2276.1000000000]) {
					linear_extrude(height = 340.0000000000) {
						polygon(paths = [[0, 1, 2, 3]], points = [[1065, -85], [1065, 85], [1235, 85], [1235, -85]]);
					}
				}
			}
			color(c = [0.5000000000, 0.5000000000, 0.5000000000]) {
				translate(v = [0, 0, 2276.1000000000]) {
					linear_extrude(height = 340.0000000000) {
						polygon(paths = [[0, 1, 2, 3]], points = [[1525, -85], [1525, 85], [1695, 85], [1695, -85]]);
					}
				}
			}
			color(c = [0.5000000000, 0.5000000000, 0.5000000000]) {
				translate(v = [0, 0, 2276.1000000000]) {
					linear_extrude(height = 340.0000000000) {
						polygon(paths = [[0, 1, 2, 3]], points = [[1985, -85], [1985, 85], [2155, 85], [2155, -85]]);
					}
				}
			}
			color(c = [0.5000000000, 0.5000000000, 0.5000000000]) {
				translate(v = [0, 0, 2276.1000000000]) {
					linear_extrude(height = 340.0000000000) {
						polygon(paths = [[0, 1, 2, 3]], points = [[145, 2635], [145, 2805], [315, 2805], [315, 2635]]);
					}
				}
			}
			color(c = [0.5000000000, 0.5000000000, 0.5000000000]) {
				translate(v = [0, 0, 2276.1000000000]) {
					linear_extrude(height = 340.0000000000) {
						polygon(paths = [[0, 1, 2, 3]], points = [[605, 2635], [605, 2805], [775, 2805], [775, 2635]]);
					}
				}
			}
			color(c = [0.5000000000, 0.5000000000, 0.5000000000]) {
				translate(v = [0, 0, 2276.1000000000]) {
					linear_extrude(height = 340.0000000000) {
						polygon(paths = [[0, 1, 2, 3]], points = [[1065, 2635], [1065, 2805], [1235, 2805], [1235, 2635]]);
					}
				}
			}
			color(c = [0.5000000000, 0.5000000000, 0.5000000000]) {
				translate(v = [0, 0, 2276.1000000000]) {
					linear_extrude(height = 340.0000000000) {
						polygon(paths = [[0, 1, 2, 3]], points = [[1525, 2635], [1525, 2805], [1695, 2805], [1695, 2635]]);
					}
				}
			}
			color(c = [0.5000000000, 0.5000000000, 0.5000000000]) {
				translate(v = [0, 0, 2276.1000000000]) {
					linear_extrude(height = 340.0000000000) {
						polygon(paths = [[0, 1, 2, 3]], points = [[1985, 2635], [1985, 2805], [2155, 2805], [2155, 2635]]);
					}
				}
			}
			color(c = [0.3000000000, 0.3000000000, 1]) {
				translate(v = [0, 0, 2616.1000000000]) {
					linear_extrude(height = 360.0000000000) {
						polygon(paths = [[0, 1, 2, 3]], points = [[0, -240], [0, 240], [2300, 240], [2300, -240]]);
					}
				}
			}
			color(c = [0.3000000000, 0.3000000000, 1]) {
				translate(v = [0, 0, 2616.1000000000]) {
					linear_extrude(height = 360.0000000000) {
						polygon(paths = [[0, 1, 2, 3]], points = [[0, 2480], [0, 2960], [2300, 2960], [2300, 2480]]);
					}
				}
			}
		}
	}
}
